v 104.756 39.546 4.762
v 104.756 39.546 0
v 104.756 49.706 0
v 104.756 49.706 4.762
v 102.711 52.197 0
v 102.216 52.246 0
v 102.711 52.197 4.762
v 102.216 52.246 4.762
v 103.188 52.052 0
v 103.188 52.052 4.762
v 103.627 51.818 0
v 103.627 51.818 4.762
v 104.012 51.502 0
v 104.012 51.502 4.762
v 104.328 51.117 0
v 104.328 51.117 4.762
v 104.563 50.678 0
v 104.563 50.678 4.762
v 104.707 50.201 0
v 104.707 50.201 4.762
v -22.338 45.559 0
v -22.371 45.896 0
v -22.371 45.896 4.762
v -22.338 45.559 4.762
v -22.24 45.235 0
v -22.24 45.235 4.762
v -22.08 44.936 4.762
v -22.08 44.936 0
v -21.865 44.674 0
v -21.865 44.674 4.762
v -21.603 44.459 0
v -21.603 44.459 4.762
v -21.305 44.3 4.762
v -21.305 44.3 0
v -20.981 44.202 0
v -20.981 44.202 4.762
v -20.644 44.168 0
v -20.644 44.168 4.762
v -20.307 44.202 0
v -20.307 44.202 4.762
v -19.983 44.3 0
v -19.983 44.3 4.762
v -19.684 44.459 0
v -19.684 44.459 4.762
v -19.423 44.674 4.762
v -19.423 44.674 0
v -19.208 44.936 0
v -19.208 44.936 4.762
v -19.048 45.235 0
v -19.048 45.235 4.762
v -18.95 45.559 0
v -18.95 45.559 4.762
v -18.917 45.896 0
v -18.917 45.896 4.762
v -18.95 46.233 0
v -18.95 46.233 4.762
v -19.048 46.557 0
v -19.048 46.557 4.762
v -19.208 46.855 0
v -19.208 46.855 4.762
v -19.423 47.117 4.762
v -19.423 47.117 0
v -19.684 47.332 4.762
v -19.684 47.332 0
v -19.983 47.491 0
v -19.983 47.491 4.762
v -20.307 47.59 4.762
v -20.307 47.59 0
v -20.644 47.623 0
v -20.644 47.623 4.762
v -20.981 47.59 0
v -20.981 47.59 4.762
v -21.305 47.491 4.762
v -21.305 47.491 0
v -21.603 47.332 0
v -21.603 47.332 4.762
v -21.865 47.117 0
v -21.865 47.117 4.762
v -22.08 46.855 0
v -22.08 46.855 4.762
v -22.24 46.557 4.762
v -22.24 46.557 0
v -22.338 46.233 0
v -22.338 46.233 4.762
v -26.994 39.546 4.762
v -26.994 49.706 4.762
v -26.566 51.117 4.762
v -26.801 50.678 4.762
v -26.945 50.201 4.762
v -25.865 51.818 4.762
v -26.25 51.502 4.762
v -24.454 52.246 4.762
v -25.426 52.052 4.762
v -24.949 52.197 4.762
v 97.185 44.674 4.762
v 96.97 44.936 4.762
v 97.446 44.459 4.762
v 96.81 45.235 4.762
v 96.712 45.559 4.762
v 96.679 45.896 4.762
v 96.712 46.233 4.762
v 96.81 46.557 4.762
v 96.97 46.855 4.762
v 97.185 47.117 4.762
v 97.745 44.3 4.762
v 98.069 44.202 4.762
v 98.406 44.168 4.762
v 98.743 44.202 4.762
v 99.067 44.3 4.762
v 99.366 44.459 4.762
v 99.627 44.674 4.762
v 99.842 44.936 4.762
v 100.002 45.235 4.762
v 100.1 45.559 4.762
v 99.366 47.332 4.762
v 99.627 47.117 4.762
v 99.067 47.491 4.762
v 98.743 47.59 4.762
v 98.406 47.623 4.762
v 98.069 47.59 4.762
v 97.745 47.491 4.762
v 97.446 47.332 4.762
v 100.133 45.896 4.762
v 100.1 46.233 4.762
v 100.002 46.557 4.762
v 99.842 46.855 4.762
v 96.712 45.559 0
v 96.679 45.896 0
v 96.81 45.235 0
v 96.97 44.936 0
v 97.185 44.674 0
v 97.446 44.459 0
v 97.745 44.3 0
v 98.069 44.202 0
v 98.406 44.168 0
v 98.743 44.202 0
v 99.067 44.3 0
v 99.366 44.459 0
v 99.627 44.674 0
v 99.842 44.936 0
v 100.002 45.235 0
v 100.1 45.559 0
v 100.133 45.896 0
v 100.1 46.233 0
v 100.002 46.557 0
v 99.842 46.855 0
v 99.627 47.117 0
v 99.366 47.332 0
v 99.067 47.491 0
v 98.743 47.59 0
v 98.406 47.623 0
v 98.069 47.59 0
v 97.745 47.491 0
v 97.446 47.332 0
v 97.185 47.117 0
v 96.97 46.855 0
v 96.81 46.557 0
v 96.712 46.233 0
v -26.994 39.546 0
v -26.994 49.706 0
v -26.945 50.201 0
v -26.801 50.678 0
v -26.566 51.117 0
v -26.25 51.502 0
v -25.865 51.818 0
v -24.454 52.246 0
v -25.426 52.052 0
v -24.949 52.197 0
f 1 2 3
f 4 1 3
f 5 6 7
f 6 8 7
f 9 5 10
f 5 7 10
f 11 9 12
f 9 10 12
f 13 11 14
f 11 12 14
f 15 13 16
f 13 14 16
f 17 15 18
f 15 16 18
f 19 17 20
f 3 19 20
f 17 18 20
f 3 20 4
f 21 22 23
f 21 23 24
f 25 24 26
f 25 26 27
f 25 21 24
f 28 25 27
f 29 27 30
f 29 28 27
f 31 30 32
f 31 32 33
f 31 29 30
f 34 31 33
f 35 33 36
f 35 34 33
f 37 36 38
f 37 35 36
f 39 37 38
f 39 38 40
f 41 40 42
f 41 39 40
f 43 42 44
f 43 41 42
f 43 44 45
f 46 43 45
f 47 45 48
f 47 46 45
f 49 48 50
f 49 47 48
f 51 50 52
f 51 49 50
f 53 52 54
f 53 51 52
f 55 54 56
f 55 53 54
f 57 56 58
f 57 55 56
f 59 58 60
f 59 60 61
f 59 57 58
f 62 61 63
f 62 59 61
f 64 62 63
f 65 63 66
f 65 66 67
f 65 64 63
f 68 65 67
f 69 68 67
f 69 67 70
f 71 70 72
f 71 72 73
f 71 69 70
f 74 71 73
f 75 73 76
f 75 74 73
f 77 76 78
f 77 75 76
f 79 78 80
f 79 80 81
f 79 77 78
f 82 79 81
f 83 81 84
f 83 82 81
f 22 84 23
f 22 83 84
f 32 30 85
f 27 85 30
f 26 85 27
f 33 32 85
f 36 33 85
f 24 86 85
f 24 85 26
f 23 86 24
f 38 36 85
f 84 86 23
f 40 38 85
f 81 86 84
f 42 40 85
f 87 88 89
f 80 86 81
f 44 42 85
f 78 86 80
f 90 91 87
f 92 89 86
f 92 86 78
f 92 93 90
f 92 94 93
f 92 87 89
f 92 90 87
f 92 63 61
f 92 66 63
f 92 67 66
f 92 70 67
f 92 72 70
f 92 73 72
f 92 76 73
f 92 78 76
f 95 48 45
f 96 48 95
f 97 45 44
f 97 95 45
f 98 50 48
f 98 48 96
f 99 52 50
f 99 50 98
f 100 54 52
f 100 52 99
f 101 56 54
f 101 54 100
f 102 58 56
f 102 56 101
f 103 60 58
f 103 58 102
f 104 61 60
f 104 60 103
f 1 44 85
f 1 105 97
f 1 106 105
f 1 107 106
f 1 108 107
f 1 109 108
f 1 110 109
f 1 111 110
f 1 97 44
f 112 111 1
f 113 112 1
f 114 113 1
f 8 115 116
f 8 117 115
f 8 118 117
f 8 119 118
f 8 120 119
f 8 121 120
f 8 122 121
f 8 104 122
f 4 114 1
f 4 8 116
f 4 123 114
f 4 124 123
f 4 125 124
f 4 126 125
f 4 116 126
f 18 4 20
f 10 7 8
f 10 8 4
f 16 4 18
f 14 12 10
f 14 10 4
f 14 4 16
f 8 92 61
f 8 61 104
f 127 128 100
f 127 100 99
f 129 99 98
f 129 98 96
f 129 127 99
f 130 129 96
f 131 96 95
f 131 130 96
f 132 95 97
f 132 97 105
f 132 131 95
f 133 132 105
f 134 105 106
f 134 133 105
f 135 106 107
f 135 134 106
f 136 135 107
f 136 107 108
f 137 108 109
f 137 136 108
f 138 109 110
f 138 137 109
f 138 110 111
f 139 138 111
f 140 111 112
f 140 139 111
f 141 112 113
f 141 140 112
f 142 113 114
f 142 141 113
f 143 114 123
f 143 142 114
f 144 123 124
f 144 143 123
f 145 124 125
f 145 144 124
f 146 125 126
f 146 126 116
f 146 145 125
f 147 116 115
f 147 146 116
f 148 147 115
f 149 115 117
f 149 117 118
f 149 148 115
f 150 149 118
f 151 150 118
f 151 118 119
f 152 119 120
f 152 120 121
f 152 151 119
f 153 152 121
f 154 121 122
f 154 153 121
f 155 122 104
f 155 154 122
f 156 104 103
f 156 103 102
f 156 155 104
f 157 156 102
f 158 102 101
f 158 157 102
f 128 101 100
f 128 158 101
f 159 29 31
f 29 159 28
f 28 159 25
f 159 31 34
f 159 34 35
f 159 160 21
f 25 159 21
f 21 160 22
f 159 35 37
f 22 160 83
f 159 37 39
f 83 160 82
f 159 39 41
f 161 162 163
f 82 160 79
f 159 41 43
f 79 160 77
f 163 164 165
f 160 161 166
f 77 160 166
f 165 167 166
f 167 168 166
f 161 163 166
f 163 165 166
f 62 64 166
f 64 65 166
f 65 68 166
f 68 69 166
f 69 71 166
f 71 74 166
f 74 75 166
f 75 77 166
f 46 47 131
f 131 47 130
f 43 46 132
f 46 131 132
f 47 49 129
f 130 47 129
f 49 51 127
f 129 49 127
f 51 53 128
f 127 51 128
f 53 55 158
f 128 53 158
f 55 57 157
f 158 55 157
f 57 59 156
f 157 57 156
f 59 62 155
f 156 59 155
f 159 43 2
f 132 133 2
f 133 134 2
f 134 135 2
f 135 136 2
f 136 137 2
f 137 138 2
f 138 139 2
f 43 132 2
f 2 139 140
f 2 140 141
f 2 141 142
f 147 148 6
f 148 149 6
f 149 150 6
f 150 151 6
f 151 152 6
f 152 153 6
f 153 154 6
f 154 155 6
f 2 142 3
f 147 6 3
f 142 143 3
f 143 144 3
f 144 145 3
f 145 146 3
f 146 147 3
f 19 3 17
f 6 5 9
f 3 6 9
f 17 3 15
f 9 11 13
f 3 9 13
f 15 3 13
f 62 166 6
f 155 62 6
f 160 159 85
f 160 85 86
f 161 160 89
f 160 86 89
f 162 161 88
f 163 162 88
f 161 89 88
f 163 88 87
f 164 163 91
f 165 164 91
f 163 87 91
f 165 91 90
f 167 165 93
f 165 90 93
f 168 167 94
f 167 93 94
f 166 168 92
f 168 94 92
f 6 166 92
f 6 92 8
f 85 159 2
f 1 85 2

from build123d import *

# Parameters (mm, degrees)
SKETCH1_W           = 131.7498
SKETCH1_H           = 12.7
SKETCH1_R           = 1.7272
BOSS_EXTRUDE1_DEPTH = 4.7625
FILLET1_R           = 2.54


with BuildPart() as part:
    # Sketch1 → Boss-Extrude1 (new body)
    with BuildSketch(Plane.XY):
        with Locations((38.881044974, 45.895610345)):
            Rectangle(SKETCH1_W, SKETCH1_H)
        with Locations(Location((-20.643855026, 45.895610345, 0), (0, 0, 180))):
            Circle(SKETCH1_R, mode=Mode.SUBTRACT)
        with Locations(Location((98.405944974, 45.895610345, 0), (0, 0, 180))):
            Circle(SKETCH1_R, mode=Mode.SUBTRACT)
    extrude(amount=BOSS_EXTRUDE1_DEPTH)

    # Fillet1
    fillet1_edges = [part.edges().sort_by_distance(p)[0] for p in [
        (-26.993855026, 52.245610345, 2.38125),
        (104.755944974, 52.245610345, 2.38125),
    ]]
    fillet(fillet1_edges, radius=FILLET1_R)


solid = part.part
